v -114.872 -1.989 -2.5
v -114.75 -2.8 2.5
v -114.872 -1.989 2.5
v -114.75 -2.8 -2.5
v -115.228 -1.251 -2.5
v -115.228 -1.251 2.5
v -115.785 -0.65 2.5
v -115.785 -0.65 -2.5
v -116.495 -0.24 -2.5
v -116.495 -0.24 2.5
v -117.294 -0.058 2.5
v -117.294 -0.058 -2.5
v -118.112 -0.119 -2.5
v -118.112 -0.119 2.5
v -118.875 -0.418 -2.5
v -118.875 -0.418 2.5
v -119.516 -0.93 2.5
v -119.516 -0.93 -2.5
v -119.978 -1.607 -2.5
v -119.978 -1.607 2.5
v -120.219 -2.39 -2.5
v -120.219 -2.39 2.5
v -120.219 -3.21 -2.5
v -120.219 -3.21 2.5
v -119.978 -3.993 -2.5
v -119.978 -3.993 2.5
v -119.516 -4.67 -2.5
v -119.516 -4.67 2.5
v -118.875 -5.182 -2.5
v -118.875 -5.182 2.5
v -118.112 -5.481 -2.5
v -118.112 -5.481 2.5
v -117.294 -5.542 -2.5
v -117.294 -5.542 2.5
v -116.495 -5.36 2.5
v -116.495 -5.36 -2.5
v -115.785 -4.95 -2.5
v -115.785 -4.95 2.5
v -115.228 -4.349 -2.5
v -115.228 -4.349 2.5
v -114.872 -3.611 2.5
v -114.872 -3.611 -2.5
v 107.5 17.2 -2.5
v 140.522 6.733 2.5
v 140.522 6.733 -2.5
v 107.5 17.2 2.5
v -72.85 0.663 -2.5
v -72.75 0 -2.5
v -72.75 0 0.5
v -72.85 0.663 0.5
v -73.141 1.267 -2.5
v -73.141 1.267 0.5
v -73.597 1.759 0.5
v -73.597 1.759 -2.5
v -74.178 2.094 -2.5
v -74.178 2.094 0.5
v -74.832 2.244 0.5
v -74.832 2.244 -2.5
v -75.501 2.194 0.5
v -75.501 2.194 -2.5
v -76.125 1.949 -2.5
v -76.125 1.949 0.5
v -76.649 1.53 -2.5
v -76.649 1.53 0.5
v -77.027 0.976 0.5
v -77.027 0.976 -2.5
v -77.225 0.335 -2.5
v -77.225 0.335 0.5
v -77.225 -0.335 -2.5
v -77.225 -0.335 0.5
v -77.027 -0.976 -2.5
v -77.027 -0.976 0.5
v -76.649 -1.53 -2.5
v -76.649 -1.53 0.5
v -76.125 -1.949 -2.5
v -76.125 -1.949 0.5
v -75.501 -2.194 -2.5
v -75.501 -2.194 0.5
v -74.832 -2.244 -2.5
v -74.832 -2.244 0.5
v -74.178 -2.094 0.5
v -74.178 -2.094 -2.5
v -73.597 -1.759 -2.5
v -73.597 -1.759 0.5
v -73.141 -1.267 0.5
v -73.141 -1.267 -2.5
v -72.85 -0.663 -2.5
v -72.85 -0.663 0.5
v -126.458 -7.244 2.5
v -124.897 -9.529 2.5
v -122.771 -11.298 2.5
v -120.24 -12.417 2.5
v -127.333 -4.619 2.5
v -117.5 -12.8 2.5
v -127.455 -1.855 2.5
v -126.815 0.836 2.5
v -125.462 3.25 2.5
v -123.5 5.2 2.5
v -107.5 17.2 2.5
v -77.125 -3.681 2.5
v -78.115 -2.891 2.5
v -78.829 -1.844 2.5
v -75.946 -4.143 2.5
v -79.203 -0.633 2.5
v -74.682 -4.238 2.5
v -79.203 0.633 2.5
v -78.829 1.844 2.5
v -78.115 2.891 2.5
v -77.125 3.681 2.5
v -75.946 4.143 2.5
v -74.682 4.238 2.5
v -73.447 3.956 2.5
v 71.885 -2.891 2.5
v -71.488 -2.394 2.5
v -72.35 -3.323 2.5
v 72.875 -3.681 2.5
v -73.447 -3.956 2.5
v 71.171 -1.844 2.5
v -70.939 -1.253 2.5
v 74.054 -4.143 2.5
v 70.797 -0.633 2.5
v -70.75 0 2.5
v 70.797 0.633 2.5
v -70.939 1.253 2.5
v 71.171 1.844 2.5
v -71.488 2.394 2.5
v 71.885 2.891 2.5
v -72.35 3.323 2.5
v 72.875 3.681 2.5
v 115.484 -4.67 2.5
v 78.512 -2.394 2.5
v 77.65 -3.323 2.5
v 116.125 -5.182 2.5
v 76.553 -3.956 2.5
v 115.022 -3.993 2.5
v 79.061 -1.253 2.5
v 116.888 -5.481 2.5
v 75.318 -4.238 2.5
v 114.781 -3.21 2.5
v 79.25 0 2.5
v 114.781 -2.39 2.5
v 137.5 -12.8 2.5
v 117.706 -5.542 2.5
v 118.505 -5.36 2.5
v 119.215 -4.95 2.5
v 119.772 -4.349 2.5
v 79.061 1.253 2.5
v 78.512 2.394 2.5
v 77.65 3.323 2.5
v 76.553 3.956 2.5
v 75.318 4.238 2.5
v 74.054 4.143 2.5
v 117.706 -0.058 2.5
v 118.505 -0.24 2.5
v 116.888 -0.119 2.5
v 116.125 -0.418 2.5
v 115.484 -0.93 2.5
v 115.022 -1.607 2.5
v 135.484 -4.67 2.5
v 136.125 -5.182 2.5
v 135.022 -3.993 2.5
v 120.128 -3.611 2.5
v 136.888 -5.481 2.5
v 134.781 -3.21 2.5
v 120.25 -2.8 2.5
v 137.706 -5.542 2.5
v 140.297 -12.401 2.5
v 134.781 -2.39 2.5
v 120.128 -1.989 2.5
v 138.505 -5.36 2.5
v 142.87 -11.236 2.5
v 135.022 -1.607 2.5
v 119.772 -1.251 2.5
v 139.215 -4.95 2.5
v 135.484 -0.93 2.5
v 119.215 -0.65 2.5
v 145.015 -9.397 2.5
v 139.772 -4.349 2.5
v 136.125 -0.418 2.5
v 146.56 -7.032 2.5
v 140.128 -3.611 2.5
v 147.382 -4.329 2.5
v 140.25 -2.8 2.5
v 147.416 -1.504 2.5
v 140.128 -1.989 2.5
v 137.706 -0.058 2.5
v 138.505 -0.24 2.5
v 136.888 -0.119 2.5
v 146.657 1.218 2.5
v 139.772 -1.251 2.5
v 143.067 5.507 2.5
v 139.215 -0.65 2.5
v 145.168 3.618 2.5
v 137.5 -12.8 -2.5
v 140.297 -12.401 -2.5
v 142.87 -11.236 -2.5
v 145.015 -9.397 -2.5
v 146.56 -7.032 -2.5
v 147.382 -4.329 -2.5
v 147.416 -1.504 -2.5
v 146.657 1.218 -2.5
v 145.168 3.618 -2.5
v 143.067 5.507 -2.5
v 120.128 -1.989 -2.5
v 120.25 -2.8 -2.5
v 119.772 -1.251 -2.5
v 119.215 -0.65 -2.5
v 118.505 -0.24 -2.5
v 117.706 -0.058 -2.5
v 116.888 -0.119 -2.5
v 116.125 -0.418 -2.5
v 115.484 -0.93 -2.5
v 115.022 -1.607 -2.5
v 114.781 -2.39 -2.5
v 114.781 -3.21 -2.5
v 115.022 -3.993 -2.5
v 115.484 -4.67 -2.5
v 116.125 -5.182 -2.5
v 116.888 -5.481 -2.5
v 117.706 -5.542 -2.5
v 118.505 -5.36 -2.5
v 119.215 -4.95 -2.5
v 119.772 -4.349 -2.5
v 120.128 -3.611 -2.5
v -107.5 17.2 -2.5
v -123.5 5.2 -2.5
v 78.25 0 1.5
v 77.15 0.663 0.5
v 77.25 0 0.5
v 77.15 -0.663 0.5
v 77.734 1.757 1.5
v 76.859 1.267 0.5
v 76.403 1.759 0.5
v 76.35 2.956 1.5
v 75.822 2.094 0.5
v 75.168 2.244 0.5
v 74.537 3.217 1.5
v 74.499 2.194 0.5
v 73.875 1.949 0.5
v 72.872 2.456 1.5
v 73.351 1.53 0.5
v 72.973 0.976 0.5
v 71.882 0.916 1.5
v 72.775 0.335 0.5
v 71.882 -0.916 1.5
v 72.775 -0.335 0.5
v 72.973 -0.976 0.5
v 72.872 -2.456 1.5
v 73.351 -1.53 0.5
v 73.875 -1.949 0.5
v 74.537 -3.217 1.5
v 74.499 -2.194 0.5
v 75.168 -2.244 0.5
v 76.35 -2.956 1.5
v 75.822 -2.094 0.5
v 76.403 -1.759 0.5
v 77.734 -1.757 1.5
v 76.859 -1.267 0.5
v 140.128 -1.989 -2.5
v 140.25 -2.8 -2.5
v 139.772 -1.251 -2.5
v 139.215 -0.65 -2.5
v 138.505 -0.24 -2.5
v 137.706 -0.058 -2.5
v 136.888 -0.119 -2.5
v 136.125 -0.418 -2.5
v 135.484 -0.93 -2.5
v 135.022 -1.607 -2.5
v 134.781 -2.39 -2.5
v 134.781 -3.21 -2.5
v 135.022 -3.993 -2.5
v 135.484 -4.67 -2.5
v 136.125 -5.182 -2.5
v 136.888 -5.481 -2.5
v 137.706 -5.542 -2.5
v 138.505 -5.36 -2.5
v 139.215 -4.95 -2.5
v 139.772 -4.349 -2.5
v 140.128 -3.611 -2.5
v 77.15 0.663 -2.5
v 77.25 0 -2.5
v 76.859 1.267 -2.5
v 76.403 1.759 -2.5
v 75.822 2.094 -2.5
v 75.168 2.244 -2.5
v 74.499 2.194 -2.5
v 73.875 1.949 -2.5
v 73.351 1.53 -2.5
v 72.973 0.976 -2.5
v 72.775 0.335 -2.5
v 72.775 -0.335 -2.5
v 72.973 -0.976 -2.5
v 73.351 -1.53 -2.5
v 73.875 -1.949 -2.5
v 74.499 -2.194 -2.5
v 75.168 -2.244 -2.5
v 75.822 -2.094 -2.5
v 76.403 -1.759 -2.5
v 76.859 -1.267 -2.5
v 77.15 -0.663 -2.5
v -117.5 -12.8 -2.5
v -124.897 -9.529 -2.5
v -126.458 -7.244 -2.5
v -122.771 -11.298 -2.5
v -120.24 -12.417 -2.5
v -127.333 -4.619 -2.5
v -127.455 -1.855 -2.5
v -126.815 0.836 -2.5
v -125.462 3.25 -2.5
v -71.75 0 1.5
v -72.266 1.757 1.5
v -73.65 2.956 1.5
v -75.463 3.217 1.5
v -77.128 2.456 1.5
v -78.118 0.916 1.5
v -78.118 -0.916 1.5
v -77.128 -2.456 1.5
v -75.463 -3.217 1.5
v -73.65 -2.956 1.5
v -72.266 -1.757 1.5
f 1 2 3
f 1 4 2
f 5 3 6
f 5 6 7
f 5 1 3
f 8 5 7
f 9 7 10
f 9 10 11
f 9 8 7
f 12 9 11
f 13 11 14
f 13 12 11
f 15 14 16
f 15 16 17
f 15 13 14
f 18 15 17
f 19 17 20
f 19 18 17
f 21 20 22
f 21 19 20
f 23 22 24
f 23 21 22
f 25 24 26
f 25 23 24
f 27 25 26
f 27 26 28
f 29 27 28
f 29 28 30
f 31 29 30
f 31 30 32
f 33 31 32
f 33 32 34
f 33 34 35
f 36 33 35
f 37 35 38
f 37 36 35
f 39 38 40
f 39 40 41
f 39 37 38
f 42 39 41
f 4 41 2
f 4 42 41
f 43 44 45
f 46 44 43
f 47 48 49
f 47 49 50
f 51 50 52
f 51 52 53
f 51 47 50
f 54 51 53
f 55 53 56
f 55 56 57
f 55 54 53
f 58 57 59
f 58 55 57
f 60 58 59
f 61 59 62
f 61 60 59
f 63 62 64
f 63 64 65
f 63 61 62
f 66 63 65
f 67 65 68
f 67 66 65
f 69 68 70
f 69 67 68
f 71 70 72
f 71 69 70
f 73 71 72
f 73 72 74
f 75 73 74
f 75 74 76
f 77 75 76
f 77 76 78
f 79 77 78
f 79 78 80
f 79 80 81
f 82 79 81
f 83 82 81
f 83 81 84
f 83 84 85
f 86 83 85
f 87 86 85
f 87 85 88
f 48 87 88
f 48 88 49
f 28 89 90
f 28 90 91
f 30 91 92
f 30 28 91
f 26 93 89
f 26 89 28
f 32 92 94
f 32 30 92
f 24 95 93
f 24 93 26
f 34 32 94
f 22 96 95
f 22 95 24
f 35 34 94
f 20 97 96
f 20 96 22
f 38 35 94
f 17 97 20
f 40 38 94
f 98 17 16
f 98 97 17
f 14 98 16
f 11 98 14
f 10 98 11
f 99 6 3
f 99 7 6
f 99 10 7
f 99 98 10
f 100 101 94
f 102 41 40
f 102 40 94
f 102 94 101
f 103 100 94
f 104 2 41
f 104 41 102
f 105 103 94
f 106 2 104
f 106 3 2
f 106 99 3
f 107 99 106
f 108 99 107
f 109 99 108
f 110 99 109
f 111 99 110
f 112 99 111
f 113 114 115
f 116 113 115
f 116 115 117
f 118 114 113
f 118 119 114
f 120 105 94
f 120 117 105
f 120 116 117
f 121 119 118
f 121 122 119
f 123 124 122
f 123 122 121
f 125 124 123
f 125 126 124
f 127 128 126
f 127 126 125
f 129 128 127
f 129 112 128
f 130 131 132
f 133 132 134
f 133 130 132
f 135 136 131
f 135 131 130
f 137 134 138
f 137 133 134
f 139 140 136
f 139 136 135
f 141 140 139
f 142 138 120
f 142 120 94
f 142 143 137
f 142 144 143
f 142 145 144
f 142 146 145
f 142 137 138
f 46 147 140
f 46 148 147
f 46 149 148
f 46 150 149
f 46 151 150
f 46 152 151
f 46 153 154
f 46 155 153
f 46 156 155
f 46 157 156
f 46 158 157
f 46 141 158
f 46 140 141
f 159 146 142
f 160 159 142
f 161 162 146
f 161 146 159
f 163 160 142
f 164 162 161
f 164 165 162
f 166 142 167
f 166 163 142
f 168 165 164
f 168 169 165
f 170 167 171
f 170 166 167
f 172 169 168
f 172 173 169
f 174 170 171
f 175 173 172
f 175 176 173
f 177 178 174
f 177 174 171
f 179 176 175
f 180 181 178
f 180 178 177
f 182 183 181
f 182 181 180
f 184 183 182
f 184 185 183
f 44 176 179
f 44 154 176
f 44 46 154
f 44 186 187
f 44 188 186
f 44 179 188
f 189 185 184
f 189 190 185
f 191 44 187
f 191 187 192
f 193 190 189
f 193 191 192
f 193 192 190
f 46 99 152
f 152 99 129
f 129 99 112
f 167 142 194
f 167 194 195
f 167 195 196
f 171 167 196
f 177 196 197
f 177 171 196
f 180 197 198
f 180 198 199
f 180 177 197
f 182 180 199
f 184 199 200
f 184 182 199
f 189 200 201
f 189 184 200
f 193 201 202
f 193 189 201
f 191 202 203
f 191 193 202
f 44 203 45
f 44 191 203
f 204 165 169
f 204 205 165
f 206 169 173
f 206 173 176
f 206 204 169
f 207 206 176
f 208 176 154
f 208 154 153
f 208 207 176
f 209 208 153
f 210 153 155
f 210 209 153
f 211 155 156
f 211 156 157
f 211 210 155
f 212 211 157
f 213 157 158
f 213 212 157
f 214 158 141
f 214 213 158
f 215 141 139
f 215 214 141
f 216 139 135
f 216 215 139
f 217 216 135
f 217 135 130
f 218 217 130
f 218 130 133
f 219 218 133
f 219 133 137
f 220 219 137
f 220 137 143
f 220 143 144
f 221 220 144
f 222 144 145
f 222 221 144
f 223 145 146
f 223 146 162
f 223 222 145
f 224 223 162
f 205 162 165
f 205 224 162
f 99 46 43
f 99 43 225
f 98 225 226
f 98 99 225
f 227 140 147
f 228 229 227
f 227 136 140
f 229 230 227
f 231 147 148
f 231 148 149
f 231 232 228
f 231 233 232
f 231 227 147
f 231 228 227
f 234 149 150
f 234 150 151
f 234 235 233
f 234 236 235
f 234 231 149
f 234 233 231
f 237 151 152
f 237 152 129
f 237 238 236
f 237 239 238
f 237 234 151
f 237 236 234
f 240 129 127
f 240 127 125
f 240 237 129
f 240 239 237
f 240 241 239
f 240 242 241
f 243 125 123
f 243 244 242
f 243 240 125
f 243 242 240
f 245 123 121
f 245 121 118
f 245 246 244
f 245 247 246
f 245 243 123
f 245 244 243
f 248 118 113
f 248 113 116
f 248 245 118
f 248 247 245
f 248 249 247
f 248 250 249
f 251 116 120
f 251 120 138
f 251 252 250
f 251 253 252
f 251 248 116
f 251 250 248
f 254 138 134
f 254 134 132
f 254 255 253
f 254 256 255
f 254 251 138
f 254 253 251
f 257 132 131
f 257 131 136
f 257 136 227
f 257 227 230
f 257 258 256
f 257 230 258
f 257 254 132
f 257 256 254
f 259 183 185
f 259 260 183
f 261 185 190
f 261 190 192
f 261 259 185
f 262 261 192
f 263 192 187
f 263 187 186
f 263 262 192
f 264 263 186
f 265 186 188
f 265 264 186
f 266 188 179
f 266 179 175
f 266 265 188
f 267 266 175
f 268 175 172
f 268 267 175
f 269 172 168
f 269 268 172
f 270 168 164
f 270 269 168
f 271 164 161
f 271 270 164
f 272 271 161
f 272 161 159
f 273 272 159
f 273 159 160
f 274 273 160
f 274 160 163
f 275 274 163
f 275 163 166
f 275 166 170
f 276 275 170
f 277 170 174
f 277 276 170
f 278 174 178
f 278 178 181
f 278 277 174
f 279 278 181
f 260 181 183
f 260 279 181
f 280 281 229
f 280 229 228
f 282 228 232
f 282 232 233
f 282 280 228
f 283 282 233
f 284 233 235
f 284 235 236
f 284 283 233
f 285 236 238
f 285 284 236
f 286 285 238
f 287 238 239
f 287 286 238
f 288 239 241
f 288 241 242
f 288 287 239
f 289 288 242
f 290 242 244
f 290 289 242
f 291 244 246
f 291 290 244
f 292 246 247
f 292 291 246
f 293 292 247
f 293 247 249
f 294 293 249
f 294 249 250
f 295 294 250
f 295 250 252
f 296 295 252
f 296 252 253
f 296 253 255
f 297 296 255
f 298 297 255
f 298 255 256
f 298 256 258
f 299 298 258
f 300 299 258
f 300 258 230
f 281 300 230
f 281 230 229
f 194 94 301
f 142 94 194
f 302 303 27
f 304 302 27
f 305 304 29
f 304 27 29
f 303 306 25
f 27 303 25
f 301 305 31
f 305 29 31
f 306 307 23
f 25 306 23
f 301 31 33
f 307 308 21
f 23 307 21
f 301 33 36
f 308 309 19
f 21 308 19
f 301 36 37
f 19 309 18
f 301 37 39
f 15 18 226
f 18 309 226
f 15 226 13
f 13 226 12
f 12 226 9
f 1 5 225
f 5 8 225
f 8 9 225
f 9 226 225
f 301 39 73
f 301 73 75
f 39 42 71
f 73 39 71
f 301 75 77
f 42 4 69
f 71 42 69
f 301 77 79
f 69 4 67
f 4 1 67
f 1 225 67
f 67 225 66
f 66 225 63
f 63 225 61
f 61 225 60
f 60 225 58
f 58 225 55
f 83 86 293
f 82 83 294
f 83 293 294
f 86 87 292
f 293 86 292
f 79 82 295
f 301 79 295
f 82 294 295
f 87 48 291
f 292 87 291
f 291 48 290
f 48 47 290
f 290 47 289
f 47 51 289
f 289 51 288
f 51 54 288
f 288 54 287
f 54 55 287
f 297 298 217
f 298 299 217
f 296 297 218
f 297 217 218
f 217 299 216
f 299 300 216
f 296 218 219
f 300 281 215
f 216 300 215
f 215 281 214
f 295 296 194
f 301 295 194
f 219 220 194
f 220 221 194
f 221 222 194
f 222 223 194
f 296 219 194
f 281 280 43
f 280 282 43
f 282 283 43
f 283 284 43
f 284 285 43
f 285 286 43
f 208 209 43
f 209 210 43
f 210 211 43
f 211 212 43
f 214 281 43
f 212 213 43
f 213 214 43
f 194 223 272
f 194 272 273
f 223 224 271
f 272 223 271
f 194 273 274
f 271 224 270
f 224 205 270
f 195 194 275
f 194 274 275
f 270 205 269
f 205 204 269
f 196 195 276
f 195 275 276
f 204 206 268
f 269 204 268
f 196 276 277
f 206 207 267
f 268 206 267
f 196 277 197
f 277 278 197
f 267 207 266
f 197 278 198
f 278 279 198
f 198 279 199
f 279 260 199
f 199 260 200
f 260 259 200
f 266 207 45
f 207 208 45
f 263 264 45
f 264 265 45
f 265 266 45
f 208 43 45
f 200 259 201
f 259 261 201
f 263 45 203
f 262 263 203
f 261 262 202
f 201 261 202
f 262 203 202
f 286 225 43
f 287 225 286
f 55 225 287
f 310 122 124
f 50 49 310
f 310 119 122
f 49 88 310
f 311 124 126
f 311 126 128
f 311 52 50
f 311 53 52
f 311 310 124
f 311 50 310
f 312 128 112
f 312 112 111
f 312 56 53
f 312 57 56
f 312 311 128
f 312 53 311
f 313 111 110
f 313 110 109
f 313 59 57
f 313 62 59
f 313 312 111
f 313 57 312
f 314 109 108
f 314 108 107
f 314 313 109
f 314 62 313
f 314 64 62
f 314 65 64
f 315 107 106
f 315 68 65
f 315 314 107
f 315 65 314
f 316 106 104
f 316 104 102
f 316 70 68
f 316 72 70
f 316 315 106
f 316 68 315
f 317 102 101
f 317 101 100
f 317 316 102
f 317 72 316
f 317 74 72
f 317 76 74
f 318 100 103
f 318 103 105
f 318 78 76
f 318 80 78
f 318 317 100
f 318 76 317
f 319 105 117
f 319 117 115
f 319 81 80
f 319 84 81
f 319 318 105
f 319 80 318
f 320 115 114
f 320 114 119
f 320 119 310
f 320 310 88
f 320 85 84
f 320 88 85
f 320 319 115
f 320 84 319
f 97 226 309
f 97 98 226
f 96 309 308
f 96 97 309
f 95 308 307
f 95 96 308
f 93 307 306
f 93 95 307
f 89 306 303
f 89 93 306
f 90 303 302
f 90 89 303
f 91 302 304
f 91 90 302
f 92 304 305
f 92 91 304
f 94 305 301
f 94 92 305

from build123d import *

# Parameters (mm, degrees)
SKETCH1_R           = 2.25
SKETCH1_R_2         = 2.75
BOSS_EXTRUDE1_DEPTH = 2.5
CHAMFER1_SIZE       = 2


with BuildPart() as part:
    # Sketch1 → Boss-Extrude1 (new body, symmetric)
    with BuildSketch(Plane.XY):
        with BuildLine():
            Line((-117.5, -12.8), (137.5, -12.8))
            ThreePointArc((137.5, -12.8), (147.382444583, -4.328819498), (140.521694793, 6.732542189))
            Line((140.521694793, 6.732542189), (107.5, 17.2))
            Line((107.5, 17.2), (-107.5, 17.2))
            Line((-107.5, 17.2), (-123.5, 5.2))
            ThreePointArc((-123.5, 5.2), (-126.986832981, -5.96227766), (-117.5, -12.8))
        make_face()
        with Locations((75, 0)):
            Circle(SKETCH1_R, mode=Mode.SUBTRACT)
        with Locations((-75, 0)):
            Circle(SKETCH1_R, mode=Mode.SUBTRACT)
        with Locations((-117.5, -2.8)):
            Circle(SKETCH1_R_2, mode=Mode.SUBTRACT)
        with Locations((117.5, -2.8)):
            Circle(SKETCH1_R_2, mode=Mode.SUBTRACT)
        with Locations((137.5, -2.8)):
            Circle(SKETCH1_R_2, mode=Mode.SUBTRACT)
    extrude(amount=BOSS_EXTRUDE1_DEPTH, both=True)

    # Chamfer1
    chamfer1_edges = [part.edges().sort_by_distance(p)[0] for p in [
        (-77.25, 0, 2.5),
        (72.75, 0, 2.5),
    ]]
    chamfer(chamfer1_edges, length=CHAMFER1_SIZE)


solid = part.part
